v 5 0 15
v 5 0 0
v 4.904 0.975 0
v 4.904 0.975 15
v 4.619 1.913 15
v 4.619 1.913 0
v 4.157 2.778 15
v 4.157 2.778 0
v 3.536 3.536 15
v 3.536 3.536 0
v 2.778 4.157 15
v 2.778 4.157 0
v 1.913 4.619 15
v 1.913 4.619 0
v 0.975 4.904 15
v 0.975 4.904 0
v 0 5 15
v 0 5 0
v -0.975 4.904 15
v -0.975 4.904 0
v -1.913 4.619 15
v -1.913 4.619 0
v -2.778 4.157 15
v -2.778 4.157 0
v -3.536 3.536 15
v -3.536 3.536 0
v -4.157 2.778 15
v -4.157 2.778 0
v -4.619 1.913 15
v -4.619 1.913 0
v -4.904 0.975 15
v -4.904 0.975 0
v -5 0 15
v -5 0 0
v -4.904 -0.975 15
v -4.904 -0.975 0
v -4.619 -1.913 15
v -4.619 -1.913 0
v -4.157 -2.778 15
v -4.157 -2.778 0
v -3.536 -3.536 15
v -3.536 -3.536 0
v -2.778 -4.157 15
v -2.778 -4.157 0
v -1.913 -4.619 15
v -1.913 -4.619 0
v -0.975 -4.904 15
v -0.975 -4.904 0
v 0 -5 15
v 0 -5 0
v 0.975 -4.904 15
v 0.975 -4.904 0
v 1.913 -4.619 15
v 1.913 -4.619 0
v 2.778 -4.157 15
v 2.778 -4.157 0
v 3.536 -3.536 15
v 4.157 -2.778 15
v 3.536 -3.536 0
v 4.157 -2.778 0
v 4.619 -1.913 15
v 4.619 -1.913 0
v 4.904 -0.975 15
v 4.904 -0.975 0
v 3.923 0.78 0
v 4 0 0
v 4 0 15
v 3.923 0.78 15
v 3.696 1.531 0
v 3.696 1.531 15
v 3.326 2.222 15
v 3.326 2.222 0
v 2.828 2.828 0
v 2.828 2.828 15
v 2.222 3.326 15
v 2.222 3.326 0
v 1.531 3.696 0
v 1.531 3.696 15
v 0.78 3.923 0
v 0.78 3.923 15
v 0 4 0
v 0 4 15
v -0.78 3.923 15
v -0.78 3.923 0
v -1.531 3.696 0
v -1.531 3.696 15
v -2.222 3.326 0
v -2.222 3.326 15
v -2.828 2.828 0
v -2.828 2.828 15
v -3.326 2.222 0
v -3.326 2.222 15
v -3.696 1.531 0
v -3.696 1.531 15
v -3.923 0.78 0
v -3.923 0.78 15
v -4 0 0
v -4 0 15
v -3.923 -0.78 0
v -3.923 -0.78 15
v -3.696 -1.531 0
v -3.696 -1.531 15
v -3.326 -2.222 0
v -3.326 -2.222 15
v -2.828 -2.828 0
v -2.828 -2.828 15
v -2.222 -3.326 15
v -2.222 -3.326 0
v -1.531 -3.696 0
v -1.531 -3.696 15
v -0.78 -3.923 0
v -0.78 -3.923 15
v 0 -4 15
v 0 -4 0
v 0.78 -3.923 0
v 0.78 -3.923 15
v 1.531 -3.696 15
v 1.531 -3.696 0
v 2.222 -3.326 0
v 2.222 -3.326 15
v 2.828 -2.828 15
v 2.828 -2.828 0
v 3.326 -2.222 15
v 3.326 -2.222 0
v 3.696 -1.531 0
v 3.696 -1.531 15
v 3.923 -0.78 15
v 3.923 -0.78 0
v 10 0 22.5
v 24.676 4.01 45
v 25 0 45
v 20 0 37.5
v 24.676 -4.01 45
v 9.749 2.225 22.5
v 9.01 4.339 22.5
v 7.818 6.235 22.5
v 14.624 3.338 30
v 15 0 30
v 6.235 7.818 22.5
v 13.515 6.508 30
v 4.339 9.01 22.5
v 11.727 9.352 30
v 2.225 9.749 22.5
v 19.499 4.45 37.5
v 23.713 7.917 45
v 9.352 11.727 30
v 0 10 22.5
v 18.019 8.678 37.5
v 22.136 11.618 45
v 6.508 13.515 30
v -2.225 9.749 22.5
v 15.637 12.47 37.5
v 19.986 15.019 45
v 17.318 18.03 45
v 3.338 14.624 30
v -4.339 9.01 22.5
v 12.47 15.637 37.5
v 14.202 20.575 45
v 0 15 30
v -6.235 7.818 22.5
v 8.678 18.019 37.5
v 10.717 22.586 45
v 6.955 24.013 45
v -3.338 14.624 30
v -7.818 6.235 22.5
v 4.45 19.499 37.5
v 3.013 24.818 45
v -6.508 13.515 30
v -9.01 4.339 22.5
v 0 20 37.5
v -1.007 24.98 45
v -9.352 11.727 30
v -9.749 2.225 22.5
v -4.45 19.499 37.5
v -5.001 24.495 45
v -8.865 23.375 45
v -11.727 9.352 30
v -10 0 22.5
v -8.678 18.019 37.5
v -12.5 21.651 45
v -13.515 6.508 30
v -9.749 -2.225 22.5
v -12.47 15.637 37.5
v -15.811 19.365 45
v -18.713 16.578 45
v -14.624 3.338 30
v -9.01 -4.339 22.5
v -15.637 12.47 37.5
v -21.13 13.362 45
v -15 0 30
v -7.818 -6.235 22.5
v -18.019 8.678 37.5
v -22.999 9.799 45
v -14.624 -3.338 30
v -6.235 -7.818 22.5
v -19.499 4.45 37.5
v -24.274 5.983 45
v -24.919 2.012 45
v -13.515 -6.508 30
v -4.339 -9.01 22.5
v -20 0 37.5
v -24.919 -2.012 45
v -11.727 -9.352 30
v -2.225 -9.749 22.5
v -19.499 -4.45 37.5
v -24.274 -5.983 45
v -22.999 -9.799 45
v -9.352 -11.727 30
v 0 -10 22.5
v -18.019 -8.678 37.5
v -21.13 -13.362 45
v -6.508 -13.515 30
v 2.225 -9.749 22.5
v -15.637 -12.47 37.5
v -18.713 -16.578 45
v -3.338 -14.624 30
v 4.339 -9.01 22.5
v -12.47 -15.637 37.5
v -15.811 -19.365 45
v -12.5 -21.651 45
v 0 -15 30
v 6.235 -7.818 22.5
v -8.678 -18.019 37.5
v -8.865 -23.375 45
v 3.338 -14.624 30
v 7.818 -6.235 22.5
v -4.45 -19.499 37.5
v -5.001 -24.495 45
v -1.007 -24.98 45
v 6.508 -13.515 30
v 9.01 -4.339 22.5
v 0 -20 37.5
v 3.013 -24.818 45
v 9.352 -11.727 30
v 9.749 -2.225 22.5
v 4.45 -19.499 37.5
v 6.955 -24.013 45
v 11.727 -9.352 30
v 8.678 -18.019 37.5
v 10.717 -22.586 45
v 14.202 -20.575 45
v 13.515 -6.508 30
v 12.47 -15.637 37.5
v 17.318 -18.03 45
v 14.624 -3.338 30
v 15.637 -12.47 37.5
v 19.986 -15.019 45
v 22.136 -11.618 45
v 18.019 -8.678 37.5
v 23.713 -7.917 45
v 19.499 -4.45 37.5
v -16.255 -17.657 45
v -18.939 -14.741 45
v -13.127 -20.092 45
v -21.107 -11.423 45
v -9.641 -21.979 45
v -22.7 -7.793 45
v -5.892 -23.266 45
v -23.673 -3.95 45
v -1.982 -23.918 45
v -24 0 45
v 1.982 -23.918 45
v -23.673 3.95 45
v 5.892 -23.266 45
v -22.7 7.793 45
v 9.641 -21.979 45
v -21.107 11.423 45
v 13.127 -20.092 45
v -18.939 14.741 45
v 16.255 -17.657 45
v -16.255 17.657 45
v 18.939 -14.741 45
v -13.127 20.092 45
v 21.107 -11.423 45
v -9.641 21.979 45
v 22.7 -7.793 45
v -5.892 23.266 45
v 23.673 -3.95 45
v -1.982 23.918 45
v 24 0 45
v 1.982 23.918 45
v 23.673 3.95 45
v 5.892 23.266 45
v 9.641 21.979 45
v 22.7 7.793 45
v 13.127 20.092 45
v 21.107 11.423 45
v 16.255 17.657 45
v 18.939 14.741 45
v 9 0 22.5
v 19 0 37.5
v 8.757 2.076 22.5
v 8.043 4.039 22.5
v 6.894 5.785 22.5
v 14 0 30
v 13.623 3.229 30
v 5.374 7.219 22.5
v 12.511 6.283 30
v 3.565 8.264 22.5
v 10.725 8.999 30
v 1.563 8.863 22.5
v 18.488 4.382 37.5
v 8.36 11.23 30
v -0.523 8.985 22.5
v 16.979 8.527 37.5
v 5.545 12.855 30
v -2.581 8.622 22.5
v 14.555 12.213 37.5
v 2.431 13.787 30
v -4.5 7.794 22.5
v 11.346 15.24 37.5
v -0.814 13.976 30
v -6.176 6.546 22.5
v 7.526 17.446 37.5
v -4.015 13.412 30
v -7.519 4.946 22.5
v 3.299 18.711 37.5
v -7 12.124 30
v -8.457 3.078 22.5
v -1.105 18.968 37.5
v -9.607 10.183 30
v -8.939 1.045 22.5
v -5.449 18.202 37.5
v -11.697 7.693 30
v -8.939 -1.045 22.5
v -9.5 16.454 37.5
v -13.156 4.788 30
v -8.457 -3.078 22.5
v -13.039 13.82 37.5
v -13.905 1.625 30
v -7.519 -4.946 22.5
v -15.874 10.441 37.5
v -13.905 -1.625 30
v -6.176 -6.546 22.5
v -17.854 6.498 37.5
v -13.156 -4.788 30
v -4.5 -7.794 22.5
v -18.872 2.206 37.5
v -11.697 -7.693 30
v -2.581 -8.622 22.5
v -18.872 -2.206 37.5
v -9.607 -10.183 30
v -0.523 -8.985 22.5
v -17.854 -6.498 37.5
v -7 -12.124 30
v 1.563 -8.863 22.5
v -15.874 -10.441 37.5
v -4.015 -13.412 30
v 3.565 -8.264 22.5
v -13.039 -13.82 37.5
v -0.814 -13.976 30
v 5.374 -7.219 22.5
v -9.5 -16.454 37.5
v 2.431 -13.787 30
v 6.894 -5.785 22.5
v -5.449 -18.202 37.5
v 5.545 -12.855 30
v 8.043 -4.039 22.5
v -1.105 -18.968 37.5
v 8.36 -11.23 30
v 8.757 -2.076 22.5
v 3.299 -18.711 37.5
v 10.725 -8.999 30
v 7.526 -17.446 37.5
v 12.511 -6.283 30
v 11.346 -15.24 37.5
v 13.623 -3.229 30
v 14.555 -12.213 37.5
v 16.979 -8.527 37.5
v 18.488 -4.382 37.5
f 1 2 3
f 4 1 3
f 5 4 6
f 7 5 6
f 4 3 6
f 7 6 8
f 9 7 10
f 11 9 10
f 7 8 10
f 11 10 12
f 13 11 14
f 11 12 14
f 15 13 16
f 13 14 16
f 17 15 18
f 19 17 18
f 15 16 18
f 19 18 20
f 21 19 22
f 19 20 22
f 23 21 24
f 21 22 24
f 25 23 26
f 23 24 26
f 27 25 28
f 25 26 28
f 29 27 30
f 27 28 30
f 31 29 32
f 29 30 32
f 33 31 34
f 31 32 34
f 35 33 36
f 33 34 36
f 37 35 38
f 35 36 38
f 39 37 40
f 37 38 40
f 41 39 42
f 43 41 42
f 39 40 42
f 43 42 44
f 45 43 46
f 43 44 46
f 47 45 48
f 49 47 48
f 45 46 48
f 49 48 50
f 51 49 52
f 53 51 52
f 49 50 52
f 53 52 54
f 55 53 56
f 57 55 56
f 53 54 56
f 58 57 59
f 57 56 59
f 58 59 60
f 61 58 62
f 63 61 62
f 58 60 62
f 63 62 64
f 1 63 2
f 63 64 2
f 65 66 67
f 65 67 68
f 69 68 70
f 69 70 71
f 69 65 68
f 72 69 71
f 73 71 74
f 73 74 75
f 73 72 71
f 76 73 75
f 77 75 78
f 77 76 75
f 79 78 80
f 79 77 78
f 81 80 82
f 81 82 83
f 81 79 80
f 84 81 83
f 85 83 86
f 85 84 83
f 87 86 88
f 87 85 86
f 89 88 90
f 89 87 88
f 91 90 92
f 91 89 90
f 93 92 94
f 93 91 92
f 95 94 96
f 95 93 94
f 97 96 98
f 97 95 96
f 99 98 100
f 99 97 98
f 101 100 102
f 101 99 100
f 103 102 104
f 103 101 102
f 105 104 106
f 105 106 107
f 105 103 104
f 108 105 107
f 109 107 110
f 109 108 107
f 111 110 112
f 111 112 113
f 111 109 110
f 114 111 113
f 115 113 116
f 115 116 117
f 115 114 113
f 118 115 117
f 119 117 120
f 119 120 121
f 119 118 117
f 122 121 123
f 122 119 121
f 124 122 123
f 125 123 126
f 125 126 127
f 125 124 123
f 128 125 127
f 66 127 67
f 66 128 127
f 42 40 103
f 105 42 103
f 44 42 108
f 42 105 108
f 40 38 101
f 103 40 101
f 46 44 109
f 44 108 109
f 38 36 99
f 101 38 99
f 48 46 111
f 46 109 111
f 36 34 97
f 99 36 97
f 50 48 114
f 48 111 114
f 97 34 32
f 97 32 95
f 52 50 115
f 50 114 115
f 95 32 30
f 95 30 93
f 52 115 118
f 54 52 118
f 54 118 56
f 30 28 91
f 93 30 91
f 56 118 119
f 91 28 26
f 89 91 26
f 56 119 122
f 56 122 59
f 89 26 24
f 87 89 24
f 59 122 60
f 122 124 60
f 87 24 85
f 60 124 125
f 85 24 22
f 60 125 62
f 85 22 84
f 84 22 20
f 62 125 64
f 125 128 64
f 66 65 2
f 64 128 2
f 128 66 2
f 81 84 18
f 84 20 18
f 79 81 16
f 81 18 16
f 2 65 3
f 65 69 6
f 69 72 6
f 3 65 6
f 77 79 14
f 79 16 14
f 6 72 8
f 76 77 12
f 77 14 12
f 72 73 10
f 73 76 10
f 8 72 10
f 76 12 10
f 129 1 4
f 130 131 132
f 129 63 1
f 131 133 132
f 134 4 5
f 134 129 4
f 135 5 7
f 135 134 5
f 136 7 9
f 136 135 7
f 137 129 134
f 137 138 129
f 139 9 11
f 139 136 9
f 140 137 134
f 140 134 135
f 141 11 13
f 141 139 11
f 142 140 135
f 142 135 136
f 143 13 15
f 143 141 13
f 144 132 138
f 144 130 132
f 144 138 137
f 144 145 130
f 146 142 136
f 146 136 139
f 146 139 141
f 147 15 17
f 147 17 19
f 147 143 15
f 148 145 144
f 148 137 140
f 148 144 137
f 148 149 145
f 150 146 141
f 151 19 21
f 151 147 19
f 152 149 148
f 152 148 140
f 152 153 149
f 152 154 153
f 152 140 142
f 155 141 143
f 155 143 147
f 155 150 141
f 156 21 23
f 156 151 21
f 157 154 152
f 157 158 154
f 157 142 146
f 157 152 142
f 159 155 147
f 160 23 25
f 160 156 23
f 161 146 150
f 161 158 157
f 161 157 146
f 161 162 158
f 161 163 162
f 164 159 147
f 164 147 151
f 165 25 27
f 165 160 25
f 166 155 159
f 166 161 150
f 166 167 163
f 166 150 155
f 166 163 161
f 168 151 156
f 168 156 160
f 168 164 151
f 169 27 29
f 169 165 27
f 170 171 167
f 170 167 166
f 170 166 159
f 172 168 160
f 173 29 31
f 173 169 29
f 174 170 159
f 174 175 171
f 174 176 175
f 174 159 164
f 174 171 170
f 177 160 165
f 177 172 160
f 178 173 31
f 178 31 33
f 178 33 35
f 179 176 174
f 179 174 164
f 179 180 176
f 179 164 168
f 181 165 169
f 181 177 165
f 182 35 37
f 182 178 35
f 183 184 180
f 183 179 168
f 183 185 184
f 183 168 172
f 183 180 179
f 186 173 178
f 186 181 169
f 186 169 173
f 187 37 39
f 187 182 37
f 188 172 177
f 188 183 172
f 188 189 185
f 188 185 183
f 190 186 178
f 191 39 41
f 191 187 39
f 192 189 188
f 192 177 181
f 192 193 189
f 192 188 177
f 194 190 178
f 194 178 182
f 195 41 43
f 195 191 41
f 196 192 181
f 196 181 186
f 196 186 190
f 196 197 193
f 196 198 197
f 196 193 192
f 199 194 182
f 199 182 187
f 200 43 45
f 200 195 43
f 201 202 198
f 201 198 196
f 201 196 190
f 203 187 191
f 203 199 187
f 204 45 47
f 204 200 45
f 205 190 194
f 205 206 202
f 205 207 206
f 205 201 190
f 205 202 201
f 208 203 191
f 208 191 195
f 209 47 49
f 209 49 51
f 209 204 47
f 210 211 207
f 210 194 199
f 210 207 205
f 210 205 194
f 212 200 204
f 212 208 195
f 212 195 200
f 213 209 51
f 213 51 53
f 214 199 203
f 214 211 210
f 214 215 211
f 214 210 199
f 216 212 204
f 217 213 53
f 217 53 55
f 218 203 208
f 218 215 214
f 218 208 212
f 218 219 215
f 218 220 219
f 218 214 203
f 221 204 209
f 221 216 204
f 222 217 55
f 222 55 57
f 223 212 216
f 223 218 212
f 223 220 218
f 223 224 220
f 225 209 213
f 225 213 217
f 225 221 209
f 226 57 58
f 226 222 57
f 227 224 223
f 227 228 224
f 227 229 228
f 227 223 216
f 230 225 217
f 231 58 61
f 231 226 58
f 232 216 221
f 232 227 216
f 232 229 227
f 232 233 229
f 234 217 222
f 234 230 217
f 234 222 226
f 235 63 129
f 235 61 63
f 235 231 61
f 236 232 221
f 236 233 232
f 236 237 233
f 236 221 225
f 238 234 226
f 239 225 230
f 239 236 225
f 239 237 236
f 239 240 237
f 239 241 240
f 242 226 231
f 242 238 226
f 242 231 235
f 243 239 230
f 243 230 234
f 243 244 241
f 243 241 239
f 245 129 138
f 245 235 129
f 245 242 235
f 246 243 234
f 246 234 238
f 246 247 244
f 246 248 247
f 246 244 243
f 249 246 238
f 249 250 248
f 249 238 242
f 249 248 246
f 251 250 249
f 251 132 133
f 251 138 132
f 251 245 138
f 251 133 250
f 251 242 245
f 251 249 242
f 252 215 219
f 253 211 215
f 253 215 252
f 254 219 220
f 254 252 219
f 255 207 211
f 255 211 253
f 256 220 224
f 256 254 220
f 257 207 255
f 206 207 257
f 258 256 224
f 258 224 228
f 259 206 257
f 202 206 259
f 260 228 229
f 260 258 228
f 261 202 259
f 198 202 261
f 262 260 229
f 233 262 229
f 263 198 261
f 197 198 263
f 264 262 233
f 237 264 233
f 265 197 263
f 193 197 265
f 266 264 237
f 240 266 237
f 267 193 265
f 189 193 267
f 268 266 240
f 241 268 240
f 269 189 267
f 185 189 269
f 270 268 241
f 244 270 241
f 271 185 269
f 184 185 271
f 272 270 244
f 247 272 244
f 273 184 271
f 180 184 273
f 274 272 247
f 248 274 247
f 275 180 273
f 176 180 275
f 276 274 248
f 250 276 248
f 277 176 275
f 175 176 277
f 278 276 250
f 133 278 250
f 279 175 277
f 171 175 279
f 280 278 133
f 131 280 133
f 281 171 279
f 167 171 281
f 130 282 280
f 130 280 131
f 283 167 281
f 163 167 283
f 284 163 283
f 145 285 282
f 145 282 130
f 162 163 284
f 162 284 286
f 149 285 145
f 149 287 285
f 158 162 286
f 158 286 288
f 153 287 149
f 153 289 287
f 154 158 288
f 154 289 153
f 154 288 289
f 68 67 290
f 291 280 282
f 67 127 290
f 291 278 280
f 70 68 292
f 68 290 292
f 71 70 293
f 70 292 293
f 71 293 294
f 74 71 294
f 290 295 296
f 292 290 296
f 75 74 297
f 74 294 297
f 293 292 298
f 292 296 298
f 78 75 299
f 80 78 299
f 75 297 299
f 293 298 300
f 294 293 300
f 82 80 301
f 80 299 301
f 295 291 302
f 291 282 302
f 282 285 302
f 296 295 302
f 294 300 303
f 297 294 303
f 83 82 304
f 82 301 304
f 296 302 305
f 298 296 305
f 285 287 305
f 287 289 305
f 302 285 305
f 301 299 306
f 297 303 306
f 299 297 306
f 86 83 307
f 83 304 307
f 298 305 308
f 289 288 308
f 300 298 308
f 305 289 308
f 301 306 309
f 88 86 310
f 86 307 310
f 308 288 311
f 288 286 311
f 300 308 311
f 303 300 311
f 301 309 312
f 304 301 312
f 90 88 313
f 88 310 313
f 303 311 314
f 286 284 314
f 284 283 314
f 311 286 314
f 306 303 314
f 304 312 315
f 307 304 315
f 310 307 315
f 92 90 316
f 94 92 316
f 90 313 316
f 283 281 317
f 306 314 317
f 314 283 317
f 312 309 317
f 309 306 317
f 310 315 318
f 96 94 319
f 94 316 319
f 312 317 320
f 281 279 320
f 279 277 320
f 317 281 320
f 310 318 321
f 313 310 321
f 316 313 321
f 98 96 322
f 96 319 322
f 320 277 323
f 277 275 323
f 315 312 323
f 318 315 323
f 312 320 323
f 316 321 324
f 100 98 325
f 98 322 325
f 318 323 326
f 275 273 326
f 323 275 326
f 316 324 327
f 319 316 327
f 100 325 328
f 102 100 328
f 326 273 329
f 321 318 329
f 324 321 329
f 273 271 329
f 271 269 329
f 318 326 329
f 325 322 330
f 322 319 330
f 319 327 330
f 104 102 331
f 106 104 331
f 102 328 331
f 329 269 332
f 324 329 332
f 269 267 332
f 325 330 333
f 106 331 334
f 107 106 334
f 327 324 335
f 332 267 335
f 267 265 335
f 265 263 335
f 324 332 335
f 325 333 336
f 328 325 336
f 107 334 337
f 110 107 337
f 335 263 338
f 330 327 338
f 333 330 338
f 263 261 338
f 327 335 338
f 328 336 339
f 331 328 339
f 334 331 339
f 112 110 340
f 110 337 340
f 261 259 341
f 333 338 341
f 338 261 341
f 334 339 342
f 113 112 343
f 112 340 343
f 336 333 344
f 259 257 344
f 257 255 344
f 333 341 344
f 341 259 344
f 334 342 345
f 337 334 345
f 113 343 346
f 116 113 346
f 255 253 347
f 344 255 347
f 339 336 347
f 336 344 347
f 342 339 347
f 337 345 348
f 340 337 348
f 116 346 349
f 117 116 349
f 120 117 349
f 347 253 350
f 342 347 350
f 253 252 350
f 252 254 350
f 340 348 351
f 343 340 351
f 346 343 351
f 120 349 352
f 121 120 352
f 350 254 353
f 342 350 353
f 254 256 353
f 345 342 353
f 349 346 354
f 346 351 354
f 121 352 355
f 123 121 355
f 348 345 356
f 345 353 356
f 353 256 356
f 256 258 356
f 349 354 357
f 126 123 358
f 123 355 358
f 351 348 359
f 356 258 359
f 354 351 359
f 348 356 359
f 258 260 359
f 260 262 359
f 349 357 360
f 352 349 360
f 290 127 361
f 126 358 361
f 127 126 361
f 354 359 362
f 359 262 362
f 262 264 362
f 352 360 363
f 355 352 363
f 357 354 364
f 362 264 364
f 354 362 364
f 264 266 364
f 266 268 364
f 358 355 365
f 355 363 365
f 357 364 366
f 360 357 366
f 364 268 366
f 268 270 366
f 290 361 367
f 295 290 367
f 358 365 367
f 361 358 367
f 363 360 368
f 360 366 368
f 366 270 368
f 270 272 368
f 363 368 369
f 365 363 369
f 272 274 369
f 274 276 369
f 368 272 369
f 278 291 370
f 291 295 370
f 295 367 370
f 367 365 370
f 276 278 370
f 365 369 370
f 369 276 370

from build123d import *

# Parameters (mm, degrees)
CYLINDER001_R     = 4
CYLINDER001_DEPTH = 15
CYLINDER_R        = 5
CYLINDER_DEPTH    = 15


with BuildPart() as con001:
    # Cone001 → Cone001 (revolve)
    with BuildSketch(Plane(origin=(0, 0, 15), x_dir=(1, 0, 0), z_dir=(0, -1, 0))):
        Polygon((0, 0), (4, 0), (24, 30), (0, 30), align=None)
    revolve(axis=Axis((0, 0, 15), (0, 0, 1)))


with BuildPart() as cut001:
    # Cone → Cone (revolve)
    with BuildSketch(Plane(origin=(0, 0, 15), x_dir=(1, 0, 0), z_dir=(0, -1, 0))):
        Polygon((0, 0), (5, 0), (25, 30), (0, 30), align=None)
    revolve(axis=Axis((0, 0, 15), (0, 0, 1)))

    # Cut001: cut Con001
    add(con001.part, mode=Mode.SUBTRACT)


with BuildPart() as cilindre001:
    # Cylinder001 → Cylinder001 (new body)
    with BuildSketch(Plane.XY):
        Circle(CYLINDER001_R)
    extrude(amount=CYLINDER001_DEPTH)


with BuildPart() as fusion:
    # Cylinder → Cylinder (new body)
    with BuildSketch(Plane.XY):
        Circle(CYLINDER_R)
    extrude(amount=CYLINDER_DEPTH)

    # Cut: cut Cilindre001
    add(cilindre001.part, mode=Mode.SUBTRACT)

    # Fusion: union Cut001
    add(cut001.part)


solid = fusion.part
